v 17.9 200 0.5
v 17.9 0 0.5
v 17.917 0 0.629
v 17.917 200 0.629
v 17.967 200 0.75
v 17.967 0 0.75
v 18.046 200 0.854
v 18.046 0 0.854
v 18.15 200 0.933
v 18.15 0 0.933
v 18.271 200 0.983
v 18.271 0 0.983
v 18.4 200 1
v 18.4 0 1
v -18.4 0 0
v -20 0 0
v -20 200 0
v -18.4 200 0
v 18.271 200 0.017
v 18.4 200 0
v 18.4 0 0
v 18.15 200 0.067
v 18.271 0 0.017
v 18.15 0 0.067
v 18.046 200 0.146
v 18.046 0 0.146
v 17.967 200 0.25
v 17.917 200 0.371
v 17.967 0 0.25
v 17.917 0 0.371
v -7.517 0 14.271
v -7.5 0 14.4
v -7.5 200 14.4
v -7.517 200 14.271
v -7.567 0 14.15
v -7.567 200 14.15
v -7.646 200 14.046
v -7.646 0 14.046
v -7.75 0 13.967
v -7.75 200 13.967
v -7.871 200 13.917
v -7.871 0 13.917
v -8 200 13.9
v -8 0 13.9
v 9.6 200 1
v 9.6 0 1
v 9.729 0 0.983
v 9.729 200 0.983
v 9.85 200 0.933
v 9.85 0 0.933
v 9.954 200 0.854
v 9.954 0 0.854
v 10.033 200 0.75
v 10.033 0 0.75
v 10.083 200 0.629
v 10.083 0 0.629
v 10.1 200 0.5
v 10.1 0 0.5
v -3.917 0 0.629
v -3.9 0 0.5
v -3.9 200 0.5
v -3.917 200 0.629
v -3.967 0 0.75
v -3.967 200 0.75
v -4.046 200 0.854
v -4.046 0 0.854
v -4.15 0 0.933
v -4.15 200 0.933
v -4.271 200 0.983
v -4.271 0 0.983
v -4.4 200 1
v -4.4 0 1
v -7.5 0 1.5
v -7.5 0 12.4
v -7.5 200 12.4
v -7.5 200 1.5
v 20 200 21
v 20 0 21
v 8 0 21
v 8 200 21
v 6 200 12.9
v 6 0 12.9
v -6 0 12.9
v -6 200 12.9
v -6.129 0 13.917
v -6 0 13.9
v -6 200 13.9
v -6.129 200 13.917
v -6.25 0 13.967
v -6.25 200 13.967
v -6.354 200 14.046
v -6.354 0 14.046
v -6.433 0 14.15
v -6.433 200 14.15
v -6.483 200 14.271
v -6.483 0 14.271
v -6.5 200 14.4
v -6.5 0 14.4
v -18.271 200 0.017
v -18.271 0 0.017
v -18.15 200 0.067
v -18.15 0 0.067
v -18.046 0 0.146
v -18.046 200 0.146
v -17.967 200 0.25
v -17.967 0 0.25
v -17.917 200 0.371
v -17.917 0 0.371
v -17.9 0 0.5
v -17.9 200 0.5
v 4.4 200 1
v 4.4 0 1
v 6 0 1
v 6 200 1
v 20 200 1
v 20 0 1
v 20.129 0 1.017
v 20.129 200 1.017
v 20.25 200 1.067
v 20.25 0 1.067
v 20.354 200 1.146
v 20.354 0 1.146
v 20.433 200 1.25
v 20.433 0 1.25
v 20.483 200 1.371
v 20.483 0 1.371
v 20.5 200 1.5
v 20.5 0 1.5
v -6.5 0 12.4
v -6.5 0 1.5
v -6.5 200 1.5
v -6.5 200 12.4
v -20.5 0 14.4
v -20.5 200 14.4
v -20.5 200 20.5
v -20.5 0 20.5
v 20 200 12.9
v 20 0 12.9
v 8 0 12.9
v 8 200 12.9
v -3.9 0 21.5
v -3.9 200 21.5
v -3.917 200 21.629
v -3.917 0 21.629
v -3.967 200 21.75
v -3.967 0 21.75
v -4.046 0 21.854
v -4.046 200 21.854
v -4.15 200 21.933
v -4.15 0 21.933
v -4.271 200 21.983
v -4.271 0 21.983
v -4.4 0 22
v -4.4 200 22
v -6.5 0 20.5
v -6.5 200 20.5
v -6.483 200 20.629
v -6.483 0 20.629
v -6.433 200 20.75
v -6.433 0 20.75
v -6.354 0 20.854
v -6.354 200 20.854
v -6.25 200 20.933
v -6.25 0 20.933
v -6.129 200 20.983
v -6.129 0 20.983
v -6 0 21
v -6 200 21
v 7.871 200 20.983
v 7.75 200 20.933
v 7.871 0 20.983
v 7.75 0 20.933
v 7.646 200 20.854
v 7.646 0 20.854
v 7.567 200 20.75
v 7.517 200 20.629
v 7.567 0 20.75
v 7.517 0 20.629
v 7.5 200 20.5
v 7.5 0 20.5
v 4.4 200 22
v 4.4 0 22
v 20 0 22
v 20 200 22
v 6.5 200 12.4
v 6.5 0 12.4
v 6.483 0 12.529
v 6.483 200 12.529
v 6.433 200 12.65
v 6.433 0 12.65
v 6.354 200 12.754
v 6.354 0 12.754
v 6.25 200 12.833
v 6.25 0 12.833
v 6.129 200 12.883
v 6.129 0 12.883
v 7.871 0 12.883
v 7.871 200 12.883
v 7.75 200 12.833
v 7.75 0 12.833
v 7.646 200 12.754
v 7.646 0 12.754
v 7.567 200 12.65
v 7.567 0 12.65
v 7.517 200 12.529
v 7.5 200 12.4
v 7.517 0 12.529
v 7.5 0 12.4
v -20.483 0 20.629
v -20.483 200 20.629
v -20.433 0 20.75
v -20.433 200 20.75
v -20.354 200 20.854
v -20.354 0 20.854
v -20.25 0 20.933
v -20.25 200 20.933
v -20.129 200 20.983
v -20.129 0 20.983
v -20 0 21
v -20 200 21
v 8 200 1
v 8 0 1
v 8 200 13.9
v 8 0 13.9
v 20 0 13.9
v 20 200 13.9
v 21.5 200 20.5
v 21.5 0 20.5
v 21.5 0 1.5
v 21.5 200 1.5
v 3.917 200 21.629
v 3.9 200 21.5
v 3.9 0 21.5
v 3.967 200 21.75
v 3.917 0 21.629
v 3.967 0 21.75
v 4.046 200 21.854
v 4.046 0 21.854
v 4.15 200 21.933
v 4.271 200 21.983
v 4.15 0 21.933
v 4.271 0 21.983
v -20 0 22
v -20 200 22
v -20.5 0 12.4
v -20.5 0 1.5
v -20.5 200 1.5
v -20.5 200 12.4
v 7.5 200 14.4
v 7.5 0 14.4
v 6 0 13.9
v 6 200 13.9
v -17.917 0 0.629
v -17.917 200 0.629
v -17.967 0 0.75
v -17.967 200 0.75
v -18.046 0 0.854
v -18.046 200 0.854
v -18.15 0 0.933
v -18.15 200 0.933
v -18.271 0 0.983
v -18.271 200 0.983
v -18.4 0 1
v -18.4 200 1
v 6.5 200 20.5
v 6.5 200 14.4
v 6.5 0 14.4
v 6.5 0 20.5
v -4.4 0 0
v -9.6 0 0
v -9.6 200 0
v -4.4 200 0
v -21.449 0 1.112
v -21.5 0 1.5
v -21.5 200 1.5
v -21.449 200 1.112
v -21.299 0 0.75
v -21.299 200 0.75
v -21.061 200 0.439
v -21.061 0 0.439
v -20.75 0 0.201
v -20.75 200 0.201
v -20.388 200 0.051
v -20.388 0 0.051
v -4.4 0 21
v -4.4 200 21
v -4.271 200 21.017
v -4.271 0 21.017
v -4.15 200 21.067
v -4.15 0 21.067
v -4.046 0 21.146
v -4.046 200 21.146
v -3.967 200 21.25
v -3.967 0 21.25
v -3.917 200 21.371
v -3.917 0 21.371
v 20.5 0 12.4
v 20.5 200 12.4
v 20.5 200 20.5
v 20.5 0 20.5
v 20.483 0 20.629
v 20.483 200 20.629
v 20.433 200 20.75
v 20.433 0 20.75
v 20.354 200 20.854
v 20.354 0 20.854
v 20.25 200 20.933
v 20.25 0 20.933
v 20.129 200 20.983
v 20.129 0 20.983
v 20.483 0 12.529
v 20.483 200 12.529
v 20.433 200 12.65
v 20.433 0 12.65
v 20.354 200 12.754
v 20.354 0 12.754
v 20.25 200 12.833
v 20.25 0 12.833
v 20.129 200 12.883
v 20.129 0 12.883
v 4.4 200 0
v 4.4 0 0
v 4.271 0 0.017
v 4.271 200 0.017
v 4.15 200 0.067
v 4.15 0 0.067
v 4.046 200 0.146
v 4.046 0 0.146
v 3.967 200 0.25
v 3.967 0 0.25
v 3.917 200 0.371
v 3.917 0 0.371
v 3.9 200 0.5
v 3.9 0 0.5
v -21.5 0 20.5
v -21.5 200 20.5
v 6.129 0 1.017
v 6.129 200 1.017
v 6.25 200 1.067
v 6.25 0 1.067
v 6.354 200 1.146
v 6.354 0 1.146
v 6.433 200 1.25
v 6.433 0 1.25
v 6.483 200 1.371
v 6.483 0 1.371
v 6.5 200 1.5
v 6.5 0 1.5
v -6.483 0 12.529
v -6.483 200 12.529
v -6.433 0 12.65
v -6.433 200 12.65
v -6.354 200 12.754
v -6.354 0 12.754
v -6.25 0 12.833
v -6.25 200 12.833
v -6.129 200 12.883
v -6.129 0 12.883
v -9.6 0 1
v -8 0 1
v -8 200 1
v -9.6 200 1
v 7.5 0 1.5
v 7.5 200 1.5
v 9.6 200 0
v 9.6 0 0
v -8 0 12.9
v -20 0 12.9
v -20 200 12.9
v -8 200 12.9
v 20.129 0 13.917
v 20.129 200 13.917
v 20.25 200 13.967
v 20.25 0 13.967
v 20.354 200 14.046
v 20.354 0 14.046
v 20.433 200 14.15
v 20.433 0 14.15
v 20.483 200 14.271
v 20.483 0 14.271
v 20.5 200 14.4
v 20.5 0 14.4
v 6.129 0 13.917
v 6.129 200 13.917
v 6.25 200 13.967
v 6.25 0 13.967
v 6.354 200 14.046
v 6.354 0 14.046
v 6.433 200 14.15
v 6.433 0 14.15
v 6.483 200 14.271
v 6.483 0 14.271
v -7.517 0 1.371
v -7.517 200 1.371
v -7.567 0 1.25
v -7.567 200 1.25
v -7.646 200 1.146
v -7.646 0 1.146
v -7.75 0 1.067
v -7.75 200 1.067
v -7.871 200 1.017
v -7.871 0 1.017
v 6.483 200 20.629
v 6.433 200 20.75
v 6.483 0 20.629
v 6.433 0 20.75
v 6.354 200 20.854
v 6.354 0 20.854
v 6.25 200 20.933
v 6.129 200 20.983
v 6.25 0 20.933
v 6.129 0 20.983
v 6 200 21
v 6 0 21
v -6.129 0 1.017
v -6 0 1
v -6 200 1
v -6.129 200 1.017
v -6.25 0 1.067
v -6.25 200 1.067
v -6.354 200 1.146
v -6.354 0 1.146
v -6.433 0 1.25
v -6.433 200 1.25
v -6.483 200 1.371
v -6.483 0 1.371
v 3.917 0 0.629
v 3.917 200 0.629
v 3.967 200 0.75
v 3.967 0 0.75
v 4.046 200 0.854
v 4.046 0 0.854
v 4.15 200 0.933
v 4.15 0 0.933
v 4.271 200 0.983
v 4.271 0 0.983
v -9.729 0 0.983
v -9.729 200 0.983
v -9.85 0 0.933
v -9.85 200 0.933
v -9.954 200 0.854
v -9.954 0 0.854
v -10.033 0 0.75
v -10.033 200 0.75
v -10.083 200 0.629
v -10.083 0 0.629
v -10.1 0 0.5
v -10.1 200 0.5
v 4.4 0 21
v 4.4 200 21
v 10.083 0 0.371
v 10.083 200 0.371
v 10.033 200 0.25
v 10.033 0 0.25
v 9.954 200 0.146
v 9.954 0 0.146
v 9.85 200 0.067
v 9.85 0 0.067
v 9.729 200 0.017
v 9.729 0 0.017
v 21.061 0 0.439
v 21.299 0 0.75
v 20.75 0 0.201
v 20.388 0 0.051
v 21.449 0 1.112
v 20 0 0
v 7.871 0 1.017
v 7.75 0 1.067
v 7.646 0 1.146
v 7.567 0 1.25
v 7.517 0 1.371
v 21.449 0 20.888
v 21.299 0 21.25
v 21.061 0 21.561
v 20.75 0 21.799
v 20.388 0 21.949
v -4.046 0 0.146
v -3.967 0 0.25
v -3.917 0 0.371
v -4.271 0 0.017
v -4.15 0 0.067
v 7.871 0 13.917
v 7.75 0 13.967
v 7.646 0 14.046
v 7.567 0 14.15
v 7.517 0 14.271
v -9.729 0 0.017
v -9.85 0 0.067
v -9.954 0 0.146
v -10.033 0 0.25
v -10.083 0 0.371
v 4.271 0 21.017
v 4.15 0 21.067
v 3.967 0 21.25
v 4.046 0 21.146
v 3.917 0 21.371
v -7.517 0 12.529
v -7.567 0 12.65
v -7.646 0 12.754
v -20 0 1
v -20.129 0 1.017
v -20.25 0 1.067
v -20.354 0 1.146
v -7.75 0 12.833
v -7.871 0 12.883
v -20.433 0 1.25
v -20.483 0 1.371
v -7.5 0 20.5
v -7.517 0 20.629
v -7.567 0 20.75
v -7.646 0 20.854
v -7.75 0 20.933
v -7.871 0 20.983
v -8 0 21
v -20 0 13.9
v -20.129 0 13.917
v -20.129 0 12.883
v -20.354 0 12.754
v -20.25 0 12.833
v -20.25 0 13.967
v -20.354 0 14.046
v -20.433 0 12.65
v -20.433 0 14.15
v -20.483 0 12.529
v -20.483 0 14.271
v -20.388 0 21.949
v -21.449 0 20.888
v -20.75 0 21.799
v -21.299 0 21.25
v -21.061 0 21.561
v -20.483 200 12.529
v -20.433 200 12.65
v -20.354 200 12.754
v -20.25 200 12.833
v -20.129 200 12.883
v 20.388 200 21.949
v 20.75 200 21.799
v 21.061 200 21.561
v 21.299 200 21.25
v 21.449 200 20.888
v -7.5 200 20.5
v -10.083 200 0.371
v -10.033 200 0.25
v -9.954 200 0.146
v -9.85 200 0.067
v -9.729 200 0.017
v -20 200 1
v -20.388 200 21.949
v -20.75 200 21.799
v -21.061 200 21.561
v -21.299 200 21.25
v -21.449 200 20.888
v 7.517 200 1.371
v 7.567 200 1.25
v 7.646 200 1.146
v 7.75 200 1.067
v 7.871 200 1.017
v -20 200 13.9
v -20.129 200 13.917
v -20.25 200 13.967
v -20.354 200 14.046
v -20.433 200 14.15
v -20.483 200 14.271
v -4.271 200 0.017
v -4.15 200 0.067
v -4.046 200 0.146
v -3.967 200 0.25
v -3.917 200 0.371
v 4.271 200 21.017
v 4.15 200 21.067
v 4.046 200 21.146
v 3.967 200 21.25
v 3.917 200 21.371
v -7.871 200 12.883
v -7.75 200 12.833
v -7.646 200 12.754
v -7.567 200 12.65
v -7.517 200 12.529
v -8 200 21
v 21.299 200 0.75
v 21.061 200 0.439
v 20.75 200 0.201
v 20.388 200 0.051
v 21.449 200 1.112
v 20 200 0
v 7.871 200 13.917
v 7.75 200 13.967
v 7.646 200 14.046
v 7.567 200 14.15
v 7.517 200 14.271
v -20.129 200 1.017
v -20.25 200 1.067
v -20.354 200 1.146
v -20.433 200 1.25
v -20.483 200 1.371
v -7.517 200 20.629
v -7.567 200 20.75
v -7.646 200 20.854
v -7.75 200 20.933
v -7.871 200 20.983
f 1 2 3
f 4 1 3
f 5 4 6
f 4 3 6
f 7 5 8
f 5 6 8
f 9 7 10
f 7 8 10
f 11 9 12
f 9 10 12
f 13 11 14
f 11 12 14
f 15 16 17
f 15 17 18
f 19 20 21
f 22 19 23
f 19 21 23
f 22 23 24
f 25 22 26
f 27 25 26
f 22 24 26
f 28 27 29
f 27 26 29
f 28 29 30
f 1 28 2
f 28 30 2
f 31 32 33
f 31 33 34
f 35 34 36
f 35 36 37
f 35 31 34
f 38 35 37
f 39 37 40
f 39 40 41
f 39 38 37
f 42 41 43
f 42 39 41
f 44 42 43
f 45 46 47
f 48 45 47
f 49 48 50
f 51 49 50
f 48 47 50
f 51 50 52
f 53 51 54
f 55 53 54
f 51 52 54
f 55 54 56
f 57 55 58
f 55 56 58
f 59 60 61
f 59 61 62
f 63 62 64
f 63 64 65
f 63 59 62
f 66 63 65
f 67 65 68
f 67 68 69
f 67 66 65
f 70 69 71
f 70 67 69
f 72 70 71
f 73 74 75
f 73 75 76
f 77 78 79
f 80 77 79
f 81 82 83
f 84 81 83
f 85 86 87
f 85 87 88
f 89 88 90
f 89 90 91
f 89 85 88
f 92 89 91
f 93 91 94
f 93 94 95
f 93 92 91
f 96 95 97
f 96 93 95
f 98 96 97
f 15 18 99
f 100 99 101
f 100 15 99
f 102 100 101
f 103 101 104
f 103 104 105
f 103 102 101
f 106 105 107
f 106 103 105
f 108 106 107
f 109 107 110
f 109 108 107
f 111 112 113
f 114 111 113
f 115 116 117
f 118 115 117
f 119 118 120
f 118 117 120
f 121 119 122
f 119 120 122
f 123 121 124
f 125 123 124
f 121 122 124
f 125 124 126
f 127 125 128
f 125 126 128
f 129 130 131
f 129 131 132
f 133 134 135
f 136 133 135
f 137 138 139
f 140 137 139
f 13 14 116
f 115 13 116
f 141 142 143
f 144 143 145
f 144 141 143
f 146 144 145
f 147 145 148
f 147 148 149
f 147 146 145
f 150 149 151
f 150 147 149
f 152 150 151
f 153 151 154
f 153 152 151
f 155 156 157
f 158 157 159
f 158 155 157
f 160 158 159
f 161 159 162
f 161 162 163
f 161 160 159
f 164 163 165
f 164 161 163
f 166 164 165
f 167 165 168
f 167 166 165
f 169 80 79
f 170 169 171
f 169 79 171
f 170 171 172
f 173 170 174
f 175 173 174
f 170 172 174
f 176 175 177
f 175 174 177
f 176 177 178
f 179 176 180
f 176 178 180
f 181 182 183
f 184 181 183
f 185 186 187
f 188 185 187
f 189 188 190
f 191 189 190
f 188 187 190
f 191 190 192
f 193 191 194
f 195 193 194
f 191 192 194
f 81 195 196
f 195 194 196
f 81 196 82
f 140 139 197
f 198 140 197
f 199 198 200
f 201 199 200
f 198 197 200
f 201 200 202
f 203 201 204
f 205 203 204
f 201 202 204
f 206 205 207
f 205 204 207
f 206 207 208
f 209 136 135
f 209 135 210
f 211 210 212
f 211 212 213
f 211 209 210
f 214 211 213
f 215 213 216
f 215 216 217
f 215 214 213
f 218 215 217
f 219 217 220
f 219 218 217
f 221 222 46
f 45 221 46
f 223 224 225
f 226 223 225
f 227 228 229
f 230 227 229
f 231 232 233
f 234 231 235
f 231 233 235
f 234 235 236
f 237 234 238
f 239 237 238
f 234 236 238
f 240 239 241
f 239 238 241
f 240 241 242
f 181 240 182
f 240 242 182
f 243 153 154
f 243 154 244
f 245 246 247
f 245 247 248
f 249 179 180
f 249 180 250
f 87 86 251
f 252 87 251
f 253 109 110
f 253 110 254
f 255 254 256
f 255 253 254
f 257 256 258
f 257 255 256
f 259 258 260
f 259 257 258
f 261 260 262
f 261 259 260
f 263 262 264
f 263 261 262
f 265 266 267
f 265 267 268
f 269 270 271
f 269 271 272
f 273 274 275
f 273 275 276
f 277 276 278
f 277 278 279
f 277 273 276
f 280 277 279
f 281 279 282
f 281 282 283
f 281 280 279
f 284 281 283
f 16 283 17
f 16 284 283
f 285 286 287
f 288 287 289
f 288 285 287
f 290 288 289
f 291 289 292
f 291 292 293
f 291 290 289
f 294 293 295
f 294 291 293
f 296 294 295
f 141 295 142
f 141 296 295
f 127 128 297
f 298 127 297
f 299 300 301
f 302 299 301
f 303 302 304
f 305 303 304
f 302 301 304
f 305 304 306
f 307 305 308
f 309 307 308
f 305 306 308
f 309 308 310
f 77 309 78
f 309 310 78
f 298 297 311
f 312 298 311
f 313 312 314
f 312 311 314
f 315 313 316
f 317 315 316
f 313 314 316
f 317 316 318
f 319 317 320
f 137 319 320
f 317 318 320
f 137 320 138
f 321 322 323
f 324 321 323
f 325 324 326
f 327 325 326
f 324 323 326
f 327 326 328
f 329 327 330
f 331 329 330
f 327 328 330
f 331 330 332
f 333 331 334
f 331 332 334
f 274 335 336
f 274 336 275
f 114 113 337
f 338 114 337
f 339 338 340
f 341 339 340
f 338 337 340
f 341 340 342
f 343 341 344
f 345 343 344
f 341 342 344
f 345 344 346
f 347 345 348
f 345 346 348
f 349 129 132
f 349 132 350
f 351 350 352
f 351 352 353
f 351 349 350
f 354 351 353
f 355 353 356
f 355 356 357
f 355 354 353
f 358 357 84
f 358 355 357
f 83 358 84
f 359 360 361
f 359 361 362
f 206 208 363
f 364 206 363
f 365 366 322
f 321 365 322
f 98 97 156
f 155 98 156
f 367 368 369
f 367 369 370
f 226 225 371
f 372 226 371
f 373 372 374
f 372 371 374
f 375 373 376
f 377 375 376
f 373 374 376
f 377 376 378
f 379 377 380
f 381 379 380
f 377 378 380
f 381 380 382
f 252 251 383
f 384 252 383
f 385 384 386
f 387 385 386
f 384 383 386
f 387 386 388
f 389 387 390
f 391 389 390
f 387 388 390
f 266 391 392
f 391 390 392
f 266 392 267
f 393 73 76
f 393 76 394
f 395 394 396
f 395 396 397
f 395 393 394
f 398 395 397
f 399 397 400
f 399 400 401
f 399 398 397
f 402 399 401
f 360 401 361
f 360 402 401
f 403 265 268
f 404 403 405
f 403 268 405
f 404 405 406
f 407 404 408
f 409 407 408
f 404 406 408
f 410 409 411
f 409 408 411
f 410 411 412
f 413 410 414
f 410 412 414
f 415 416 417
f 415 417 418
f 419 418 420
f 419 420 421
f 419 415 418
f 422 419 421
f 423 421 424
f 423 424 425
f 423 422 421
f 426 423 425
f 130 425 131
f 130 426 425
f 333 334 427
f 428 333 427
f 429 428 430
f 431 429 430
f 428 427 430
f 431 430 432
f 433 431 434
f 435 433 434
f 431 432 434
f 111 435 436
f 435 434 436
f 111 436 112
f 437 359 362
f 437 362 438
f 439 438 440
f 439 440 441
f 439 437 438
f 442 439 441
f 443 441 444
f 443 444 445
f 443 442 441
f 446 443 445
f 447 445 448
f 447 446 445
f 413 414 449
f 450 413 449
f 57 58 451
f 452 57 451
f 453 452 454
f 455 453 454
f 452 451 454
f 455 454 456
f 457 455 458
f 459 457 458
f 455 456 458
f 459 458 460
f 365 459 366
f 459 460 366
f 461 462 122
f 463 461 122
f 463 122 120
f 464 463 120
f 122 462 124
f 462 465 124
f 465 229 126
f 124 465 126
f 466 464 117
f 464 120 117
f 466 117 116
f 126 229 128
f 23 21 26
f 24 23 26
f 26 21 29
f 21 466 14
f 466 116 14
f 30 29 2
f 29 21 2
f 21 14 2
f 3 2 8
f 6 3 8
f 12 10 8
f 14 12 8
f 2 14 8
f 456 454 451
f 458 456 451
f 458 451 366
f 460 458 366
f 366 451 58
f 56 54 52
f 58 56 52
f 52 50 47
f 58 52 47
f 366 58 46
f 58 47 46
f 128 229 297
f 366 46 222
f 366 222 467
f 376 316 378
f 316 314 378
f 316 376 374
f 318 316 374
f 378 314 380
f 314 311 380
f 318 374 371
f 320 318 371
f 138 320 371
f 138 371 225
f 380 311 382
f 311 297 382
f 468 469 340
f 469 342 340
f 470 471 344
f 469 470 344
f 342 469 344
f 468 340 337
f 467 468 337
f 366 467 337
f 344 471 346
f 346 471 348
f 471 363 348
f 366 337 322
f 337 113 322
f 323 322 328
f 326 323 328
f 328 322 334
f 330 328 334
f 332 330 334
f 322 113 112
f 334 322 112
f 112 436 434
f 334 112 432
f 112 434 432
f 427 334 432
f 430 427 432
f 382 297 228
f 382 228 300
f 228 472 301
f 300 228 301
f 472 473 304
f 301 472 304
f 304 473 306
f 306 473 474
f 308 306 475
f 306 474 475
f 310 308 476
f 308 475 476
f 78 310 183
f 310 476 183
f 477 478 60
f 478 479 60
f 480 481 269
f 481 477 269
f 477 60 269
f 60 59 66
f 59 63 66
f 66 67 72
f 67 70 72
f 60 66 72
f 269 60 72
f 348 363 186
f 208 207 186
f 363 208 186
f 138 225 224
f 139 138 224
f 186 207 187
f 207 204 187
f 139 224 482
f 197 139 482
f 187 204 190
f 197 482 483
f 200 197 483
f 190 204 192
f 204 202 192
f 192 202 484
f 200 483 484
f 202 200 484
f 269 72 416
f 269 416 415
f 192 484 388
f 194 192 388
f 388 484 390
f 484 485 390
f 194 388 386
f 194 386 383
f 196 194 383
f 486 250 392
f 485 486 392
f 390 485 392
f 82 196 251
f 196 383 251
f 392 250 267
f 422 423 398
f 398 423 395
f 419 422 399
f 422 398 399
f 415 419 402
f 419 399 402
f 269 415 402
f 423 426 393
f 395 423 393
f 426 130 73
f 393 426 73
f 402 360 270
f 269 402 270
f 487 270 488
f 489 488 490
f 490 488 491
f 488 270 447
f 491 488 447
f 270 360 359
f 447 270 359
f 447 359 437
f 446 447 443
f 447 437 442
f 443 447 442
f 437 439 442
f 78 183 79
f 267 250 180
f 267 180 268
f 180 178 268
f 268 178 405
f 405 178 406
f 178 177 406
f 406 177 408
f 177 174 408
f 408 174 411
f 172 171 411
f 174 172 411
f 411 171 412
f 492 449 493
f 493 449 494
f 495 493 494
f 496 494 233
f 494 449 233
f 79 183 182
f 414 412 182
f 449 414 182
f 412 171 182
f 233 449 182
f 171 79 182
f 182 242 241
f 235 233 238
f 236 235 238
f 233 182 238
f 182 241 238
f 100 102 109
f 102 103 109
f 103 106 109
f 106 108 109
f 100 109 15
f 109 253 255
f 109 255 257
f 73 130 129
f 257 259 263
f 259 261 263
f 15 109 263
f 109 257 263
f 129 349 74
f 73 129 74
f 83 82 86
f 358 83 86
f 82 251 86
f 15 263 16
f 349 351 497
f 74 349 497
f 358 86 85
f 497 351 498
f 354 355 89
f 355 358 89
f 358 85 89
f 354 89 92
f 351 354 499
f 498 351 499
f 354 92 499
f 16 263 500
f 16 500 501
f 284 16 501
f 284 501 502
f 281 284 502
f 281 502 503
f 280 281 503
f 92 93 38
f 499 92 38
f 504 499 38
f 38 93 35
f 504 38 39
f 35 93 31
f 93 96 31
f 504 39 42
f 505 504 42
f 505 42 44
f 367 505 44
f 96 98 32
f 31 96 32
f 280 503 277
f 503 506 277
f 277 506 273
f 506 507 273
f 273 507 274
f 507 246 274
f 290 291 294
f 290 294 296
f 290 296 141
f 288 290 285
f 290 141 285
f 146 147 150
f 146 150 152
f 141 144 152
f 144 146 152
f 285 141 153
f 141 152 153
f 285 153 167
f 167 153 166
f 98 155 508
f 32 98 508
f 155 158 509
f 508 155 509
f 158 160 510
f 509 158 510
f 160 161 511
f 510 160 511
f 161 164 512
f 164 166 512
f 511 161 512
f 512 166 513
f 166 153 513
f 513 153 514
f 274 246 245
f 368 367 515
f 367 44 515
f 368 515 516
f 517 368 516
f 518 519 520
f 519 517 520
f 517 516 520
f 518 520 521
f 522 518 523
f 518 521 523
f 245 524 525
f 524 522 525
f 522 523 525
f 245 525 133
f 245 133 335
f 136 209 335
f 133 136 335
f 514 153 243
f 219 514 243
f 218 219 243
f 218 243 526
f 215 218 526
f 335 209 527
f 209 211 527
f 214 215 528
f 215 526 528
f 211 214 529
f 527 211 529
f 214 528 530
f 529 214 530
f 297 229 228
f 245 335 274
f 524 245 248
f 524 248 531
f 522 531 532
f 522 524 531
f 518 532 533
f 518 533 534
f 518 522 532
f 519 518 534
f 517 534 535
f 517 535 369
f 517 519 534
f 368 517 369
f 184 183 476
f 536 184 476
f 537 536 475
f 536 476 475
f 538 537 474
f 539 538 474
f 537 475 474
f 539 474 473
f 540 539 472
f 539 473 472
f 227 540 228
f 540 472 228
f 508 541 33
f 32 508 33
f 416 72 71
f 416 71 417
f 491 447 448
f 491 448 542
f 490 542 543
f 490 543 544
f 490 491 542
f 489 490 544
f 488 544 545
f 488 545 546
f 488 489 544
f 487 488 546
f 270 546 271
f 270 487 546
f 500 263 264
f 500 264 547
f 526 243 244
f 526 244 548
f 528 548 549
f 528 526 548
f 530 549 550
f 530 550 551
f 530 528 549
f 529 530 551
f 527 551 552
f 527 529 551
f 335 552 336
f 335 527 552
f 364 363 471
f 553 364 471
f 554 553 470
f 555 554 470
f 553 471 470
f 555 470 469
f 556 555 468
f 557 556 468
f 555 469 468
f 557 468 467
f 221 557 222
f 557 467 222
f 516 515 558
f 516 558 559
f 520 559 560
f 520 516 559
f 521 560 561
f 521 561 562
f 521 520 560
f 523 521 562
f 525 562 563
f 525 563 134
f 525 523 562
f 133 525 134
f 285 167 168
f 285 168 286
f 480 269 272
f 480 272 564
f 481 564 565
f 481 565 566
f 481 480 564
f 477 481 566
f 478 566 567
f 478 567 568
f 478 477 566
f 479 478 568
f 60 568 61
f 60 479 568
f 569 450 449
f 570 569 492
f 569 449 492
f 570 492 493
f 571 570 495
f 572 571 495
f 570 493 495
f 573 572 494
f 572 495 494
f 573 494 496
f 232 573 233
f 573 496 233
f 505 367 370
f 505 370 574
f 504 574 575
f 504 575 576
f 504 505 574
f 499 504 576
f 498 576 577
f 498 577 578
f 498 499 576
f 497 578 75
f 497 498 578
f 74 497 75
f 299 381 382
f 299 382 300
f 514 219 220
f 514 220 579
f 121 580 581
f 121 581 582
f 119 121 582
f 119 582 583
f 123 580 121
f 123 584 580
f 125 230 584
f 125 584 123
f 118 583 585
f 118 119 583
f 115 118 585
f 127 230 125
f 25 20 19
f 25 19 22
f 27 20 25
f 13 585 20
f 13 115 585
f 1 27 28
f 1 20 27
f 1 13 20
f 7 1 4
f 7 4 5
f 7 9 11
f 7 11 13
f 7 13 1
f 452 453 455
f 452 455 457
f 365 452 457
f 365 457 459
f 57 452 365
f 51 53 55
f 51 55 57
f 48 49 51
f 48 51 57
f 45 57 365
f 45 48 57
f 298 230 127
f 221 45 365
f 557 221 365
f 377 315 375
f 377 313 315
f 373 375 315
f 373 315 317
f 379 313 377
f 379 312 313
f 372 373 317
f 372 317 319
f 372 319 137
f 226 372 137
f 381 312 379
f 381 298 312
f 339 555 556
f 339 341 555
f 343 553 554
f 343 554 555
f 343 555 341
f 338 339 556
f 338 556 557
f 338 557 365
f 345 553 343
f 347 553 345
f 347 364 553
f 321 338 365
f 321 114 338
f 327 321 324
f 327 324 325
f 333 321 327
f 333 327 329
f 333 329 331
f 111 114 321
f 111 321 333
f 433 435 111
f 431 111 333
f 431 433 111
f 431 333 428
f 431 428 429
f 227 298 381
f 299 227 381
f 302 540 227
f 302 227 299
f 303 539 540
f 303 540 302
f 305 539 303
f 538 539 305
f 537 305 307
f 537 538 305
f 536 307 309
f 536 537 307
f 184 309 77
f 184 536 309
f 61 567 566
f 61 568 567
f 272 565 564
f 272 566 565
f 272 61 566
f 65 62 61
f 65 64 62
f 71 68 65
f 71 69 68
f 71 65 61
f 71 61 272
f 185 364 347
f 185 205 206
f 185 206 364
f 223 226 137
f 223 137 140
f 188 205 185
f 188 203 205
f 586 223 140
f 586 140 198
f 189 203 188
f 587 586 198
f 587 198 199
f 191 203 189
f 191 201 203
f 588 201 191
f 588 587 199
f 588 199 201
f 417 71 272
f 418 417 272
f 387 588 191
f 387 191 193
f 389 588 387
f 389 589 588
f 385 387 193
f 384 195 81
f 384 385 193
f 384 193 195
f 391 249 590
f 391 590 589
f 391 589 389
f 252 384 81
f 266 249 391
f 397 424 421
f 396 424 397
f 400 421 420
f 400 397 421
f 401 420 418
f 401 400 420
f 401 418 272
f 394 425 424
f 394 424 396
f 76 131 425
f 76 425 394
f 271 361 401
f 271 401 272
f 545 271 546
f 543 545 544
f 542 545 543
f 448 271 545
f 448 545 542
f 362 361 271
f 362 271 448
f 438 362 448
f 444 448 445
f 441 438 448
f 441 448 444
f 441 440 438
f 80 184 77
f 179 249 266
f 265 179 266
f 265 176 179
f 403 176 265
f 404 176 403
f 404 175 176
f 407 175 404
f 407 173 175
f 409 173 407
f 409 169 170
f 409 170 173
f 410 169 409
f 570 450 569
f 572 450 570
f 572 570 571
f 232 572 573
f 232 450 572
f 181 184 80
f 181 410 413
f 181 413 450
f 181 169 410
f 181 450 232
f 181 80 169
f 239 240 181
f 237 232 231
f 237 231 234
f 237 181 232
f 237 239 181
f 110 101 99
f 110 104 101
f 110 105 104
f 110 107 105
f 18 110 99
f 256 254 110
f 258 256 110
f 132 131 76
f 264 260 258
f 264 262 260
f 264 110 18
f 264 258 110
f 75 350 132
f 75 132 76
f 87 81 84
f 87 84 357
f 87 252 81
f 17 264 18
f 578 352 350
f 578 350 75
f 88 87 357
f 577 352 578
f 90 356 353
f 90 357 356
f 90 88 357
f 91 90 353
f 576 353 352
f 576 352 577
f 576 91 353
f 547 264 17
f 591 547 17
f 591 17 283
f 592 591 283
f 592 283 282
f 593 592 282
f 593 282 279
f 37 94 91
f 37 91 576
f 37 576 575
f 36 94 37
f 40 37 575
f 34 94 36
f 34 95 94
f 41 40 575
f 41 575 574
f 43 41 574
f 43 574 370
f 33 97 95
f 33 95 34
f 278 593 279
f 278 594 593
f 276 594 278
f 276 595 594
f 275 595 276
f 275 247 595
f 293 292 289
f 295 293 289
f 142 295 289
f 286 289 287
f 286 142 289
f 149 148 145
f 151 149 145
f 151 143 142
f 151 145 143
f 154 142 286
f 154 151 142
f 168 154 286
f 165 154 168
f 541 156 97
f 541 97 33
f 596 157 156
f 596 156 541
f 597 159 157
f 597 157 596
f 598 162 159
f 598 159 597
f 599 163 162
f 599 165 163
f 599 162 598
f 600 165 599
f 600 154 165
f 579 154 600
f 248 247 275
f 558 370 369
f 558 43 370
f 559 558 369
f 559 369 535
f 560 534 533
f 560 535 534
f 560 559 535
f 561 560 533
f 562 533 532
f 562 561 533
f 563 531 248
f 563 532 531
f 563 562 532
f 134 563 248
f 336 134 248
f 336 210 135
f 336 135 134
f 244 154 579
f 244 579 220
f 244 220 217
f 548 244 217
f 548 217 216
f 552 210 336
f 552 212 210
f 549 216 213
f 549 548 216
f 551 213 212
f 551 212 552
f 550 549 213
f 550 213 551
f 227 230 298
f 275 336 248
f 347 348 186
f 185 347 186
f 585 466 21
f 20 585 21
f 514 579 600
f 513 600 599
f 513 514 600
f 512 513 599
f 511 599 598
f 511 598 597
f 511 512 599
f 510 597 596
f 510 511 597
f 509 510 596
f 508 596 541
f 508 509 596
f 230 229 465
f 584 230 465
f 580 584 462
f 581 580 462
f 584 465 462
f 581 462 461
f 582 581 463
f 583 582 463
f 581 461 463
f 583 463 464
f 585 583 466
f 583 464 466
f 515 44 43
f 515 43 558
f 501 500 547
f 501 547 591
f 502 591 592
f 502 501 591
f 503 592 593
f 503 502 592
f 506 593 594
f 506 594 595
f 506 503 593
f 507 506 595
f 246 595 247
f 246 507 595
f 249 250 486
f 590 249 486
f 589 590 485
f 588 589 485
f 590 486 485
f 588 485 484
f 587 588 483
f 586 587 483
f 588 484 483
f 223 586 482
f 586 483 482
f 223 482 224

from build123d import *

# Parameters (mm, degrees)
F1_DEPTH = 200


# Not quite as in the source:
# - a pattern or mirror of a feature is missing from the dataset's text; its kind, count and spacing are read off the source's solid


with BuildPart() as f1:
    # F0 (on Front) → F1 (new body)
    with BuildSketch(Plane.XZ):
        with BuildLine():
            ThreePointArc((-3.9, 21.5), (-4.0464466094, 21.8535533906), (-4.4, 22))
            Line((-4.4, 22), (-20, 22))
            ThreePointArc((-20, 22), (-21.0606601718, 21.5606601718), (-21.5, 20.5))
            Line((-21.5, 20.5), (-21.5, 1.5))
            ThreePointArc((-21.5, 1.5), (-21.0606601718, 0.4393398282), (-20, 0))
            Line((-20, 0), (-18.4, 0))
            ThreePointArc((-18.4, 0), (-18.0464466094, 0.1464466094), (-17.9, 0.5))
            ThreePointArc((-17.9, 0.5), (-18.0464466094, 0.8535533906), (-18.4, 1))
            Line((-18.4, 1), (-20, 1))
            ThreePointArc((-20, 1), (-20.3535533906, 1.1464466094), (-20.5, 1.5))
            Line((-20.5, 1.5), (-20.5, 12.4))
            ThreePointArc((-20.5, 12.4), (-20.3535533906, 12.7535533906), (-20, 12.9))
            Line((-20, 12.9), (-8, 12.9))
            ThreePointArc((-8, 12.9), (-7.6464466094, 12.7535533906), (-7.5, 12.4))
            Line((-7.5, 12.4), (-7.5, 1.5))
            ThreePointArc((-7.5, 1.5), (-7.6464466094, 1.1464466094), (-8, 1))
            Line((-8, 1), (-9.6, 1))
            ThreePointArc((-9.6, 1), (-9.9535533906, 0.8535533906), (-10.1, 0.5))
            ThreePointArc((-10.1, 0.5), (-9.9535533906, 0.1464466094), (-9.6, 0))
            Line((-9.6, 0), (-4.4, 0))
            ThreePointArc((-4.4, 0), (-4.0464466094, 0.1464466094), (-3.9, 0.5))
            ThreePointArc((-3.9, 0.5), (-4.0464466094, 0.8535533906), (-4.4, 1))
            Line((-4.4, 1), (-6, 1))
            ThreePointArc((-6, 1), (-6.3535533906, 1.1464466094), (-6.5, 1.5))
            Line((-6.5, 1.5), (-6.5, 12.4))
            ThreePointArc((-6.5, 12.4), (-6.3535533906, 12.7535533906), (-6, 12.9))
            Line((-6, 12.9), (0, 12.9))
            Line((0, 12.9), (0, 13.9))
            Line((0, 13.9), (-6, 13.9))
            ThreePointArc((-6, 13.9), (-6.3535533906, 14.0464466094), (-6.5, 14.4))
            Line((-6.5, 14.4), (-6.5, 20.5))
            ThreePointArc((-6.5, 20.5), (-6.3535533906, 20.8535533906), (-6, 21))
            Line((-6, 21), (-4.4, 21))
            ThreePointArc((-4.4, 21), (-4.0464466094, 21.1464466094), (-3.9, 21.5))
        make_face()
        with BuildLine():
            Line((-8, 13.9), (-20, 13.9))
            ThreePointArc((-20, 13.9), (-20.3535533906, 14.0464466094), (-20.5, 14.4))
            Line((-20.5, 14.4), (-20.5, 20.5))
            ThreePointArc((-20.5, 20.5), (-20.3535533906, 20.8535533906), (-20, 21))
            Line((-20, 21), (-8, 21))
            ThreePointArc((-8, 21), (-7.6464466094, 20.8535533906), (-7.5, 20.5))
            Line((-7.5, 20.5), (-7.5, 14.4))
            ThreePointArc((-7.5, 14.4), (-7.6464466094, 14.0464466094), (-8, 13.9))
        make_face(mode=Mode.SUBTRACT)
    extrude(amount=-F1_DEPTH)

    # F1_copies: F1 across plane


with BuildPart() as f1_1:
    add(f1.part)
    add(f1.part.mirror(Plane(origin=(0, 0, 0), x_dir=(0, 0, 1), z_dir=(1, 0, 0))))


solid = f1_1.part
